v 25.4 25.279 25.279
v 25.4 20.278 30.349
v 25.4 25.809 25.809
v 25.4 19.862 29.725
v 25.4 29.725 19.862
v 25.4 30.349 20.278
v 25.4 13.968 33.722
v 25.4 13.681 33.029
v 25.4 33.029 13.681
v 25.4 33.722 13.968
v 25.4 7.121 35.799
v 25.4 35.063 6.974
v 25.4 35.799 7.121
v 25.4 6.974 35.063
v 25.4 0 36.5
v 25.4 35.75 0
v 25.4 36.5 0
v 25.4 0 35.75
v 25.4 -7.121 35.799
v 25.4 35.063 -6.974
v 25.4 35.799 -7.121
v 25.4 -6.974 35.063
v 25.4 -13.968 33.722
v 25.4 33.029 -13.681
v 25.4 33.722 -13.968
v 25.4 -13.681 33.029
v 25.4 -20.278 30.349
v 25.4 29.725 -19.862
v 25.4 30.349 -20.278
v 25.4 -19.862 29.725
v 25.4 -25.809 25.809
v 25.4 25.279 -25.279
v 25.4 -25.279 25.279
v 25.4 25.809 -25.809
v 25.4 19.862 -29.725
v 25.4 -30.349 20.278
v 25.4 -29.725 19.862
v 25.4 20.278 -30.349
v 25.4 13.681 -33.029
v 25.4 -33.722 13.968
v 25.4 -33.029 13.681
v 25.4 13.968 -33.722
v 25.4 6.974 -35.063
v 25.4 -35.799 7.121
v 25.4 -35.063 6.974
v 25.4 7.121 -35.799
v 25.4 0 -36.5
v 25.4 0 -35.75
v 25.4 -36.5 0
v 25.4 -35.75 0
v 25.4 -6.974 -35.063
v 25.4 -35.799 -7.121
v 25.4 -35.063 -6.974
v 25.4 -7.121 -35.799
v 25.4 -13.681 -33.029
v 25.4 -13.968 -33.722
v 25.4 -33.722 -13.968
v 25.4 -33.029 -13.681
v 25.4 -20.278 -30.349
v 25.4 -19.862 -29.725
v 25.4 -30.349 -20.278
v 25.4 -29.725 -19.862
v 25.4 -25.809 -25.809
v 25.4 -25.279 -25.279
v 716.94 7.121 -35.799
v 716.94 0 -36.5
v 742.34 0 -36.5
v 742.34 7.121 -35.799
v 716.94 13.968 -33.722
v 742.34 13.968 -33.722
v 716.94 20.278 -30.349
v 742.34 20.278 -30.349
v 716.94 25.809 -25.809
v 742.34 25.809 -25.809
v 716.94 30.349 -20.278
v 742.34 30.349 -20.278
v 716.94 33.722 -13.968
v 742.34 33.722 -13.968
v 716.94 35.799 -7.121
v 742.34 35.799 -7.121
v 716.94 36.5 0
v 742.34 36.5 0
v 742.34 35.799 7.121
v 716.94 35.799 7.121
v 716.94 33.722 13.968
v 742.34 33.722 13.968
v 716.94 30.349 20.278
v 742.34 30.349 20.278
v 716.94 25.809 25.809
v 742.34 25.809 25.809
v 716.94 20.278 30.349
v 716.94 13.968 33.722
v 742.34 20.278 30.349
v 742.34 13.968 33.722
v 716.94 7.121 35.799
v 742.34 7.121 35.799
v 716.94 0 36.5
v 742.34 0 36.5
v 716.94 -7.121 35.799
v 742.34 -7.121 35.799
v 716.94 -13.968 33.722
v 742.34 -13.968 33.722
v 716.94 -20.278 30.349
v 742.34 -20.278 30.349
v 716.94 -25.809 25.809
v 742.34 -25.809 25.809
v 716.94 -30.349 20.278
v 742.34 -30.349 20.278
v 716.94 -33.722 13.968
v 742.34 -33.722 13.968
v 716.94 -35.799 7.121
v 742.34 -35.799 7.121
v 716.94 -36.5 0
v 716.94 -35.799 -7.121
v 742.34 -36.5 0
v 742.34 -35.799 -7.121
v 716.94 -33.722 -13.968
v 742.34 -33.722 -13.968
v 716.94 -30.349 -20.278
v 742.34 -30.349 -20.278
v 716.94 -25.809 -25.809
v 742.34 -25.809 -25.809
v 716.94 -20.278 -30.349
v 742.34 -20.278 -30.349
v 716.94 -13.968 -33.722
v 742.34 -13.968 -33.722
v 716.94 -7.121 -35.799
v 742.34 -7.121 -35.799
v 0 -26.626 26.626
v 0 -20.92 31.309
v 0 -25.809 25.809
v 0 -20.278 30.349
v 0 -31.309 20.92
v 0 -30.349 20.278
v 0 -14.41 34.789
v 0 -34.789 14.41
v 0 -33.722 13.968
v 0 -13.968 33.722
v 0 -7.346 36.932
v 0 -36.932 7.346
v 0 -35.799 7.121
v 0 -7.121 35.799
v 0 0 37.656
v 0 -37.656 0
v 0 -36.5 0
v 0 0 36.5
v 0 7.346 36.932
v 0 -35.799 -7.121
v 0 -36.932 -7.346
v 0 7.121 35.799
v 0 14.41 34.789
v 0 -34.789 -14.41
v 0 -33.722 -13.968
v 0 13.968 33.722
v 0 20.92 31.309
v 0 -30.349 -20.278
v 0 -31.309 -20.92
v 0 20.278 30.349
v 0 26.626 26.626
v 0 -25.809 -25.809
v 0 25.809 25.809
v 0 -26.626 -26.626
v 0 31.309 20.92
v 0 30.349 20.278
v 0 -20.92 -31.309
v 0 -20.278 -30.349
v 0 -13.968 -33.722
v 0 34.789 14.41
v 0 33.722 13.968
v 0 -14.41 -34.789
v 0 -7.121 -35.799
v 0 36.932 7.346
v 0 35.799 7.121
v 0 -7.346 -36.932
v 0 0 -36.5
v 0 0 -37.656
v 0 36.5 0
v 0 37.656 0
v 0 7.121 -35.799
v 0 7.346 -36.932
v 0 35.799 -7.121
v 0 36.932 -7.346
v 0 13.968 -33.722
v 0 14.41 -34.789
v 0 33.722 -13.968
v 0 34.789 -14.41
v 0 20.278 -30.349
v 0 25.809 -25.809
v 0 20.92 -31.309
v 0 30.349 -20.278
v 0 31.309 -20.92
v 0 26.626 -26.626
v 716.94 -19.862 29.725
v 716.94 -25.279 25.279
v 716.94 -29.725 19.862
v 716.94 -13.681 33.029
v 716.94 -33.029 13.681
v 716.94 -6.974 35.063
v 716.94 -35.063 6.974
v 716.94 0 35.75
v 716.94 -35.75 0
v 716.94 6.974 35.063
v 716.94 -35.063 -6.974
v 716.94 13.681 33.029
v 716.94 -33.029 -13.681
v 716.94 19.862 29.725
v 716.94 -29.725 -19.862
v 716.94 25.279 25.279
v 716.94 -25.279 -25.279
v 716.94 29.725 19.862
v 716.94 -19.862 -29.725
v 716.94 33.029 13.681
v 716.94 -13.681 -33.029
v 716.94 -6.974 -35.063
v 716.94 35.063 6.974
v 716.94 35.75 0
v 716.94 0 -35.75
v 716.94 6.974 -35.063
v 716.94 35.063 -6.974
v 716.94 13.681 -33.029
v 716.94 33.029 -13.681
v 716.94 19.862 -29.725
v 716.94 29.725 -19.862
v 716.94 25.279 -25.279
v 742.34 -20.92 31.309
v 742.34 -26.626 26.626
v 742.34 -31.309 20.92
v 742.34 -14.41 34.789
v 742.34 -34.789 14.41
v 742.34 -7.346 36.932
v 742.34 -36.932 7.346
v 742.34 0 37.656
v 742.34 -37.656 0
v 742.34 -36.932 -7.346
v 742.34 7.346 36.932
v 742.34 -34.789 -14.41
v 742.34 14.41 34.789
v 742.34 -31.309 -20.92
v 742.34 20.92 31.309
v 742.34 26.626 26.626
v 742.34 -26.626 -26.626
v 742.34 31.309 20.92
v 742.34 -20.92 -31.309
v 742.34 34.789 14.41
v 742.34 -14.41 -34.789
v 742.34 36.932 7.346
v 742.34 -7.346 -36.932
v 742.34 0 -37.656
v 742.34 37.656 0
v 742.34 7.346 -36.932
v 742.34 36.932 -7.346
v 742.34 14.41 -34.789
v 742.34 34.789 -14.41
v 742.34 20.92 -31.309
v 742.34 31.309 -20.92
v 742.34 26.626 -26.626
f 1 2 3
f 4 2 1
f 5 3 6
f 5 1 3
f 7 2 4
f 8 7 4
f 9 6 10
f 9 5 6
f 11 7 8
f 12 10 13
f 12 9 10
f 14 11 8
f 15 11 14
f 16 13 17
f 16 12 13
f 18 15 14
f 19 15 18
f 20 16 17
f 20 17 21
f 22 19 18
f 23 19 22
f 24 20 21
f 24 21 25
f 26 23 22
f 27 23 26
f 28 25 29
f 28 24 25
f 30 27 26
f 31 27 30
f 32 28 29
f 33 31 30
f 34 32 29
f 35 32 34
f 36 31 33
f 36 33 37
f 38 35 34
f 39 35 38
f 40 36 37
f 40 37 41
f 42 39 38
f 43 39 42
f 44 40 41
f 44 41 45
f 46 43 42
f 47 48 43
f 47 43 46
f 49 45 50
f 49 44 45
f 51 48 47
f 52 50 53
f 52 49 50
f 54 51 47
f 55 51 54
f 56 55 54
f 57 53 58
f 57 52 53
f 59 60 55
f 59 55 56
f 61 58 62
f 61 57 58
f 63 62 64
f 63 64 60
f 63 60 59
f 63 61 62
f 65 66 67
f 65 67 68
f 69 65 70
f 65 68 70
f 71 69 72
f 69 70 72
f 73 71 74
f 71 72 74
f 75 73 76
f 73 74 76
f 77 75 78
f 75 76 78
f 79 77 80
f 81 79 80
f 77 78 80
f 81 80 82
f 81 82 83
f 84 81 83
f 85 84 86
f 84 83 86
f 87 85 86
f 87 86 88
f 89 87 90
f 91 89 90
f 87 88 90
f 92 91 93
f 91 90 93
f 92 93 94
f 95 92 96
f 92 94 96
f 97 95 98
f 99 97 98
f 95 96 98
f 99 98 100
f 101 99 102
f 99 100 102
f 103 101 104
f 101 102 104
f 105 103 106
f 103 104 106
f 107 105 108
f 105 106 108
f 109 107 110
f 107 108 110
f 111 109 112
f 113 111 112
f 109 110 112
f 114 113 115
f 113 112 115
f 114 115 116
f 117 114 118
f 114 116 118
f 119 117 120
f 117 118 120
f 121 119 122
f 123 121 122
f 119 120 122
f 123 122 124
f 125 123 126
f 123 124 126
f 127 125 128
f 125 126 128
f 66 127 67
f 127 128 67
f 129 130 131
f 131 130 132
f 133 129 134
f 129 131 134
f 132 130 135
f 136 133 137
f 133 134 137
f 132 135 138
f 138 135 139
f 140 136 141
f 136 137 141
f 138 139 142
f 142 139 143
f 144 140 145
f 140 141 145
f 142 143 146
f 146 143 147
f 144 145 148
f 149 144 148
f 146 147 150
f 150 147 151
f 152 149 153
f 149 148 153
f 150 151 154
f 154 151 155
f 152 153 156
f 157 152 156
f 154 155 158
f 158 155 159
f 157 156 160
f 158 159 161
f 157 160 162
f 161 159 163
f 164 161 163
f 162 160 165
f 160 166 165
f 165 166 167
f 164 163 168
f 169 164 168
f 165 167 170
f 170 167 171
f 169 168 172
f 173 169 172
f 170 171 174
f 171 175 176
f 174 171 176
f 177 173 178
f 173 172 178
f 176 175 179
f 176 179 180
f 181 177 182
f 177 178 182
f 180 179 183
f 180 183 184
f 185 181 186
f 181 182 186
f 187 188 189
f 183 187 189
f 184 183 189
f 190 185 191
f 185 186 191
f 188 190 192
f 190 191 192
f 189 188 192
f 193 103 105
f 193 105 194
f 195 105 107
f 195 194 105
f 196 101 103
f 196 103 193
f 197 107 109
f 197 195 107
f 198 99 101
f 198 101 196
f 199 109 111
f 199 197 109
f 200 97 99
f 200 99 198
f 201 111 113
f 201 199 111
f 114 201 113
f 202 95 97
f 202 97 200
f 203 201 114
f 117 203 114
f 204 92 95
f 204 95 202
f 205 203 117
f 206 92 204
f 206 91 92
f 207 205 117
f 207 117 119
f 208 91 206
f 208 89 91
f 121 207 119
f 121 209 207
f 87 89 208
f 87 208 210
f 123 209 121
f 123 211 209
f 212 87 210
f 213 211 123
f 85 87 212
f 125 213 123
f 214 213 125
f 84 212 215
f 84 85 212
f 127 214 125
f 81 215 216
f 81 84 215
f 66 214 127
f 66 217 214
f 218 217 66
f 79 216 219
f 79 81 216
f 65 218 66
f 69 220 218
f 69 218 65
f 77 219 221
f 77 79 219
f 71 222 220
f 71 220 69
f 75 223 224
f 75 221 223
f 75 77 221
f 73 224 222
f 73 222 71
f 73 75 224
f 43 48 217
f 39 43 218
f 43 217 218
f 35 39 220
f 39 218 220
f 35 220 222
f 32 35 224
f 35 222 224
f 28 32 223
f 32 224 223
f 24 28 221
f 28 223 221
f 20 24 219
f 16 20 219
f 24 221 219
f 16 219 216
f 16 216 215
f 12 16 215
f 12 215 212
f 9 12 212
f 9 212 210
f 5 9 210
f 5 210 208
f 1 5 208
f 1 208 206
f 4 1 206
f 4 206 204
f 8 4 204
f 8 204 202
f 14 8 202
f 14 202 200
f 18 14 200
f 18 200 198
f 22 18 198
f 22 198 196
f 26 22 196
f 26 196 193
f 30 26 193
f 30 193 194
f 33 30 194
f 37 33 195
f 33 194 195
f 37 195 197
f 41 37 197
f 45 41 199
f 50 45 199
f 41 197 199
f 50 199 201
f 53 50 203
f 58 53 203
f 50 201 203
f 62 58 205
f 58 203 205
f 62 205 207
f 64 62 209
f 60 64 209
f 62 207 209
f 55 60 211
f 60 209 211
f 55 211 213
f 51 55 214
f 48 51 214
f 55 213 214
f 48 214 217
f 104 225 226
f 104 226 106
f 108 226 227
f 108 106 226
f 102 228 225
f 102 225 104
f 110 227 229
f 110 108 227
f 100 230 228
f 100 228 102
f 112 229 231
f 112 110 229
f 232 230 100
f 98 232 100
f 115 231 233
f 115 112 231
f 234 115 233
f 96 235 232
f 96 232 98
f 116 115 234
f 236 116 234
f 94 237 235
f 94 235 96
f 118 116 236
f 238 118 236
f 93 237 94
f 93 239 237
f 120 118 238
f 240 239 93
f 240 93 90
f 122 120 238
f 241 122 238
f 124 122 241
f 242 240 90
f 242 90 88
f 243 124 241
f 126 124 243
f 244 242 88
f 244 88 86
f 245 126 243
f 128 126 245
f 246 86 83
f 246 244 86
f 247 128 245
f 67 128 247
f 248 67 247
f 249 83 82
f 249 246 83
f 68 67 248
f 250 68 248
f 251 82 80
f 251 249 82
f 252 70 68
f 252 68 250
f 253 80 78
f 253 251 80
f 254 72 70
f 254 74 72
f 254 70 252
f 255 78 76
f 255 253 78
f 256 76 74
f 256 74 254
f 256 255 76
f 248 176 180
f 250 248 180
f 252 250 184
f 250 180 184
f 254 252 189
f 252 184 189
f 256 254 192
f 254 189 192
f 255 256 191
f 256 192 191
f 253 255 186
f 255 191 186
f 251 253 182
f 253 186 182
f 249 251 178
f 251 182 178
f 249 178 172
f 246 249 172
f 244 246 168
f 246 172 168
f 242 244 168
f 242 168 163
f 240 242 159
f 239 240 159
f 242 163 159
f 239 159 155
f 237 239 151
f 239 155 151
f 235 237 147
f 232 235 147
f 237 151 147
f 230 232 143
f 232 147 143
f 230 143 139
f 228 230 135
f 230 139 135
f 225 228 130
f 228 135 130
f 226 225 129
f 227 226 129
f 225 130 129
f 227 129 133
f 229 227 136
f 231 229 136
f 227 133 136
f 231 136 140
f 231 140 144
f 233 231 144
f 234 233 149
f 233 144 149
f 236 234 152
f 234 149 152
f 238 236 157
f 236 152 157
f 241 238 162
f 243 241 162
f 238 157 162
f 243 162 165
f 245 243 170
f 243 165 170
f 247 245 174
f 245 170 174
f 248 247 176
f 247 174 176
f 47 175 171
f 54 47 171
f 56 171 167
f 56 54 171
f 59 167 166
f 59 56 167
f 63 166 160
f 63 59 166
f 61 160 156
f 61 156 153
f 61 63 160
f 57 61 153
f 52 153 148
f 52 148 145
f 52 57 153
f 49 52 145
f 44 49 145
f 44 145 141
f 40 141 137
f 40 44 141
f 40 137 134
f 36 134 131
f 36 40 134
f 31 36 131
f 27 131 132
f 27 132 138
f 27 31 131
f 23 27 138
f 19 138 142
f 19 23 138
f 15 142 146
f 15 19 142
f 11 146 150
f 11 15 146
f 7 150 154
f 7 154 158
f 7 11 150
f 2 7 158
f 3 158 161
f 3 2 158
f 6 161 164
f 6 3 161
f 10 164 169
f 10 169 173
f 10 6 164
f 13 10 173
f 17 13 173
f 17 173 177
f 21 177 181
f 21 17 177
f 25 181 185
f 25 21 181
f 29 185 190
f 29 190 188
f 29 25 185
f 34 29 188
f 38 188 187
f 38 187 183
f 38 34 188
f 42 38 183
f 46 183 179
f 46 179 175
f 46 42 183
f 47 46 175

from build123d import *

# Parameters (mm, degrees)
SKETCH1_R           = 37.6555
BOSS_EXTRUDE1_DEPTH = 742.3404
SKETCH4_R           = 36.5
CUT_EXTRUDE2_DEPTH  = 25.4
CUT_EXTRUDE3_START  = -25.4
SKETCH5_R           = 36.5
CUT_EXTRUDE3_DEPTH  = 25.4
SKETCH6_R           = 35.75
CUT_EXTRUDE4_DEPTH  = 719.915440447


with BuildPart() as part:
    # Sketch1 → Boss-Extrude1 (new body)
    with BuildSketch(Plane(origin=(0, 0, 0), x_dir=(0, 0, -1), z_dir=(1, 0, 0))):
        Circle(SKETCH1_R)
    extrude(amount=BOSS_EXTRUDE1_DEPTH)

    # Sketch4 → Cut-Extrude2 (cut)
    with BuildSketch(Plane(origin=(742.3404, 0, 0), x_dir=(0, 0, -1), z_dir=(1, 0, 0))):
        Circle(SKETCH4_R)
    extrude(amount=-CUT_EXTRUDE2_DEPTH, mode=Mode.SUBTRACT)

    # Sketch5 → Cut-Extrude3 (cut)
    with BuildSketch(Plane.ZY.offset(CUT_EXTRUDE3_START)):
        with Locations(Location((0, 0, 0), (0, 0, 180))):
            Circle(SKETCH5_R)
    extrude(amount=CUT_EXTRUDE3_DEPTH, mode=Mode.SUBTRACT)

    # Sketch6 → Cut-Extrude4 (cut, through all)
    with BuildSketch(Plane(origin=(716.9404, 0, 0), x_dir=(0, 0, -1), z_dir=(1, 0, 0))):
        Circle(SKETCH6_R)
    extrude(amount=-CUT_EXTRUDE4_DEPTH, mode=Mode.SUBTRACT)


solid = part.part
